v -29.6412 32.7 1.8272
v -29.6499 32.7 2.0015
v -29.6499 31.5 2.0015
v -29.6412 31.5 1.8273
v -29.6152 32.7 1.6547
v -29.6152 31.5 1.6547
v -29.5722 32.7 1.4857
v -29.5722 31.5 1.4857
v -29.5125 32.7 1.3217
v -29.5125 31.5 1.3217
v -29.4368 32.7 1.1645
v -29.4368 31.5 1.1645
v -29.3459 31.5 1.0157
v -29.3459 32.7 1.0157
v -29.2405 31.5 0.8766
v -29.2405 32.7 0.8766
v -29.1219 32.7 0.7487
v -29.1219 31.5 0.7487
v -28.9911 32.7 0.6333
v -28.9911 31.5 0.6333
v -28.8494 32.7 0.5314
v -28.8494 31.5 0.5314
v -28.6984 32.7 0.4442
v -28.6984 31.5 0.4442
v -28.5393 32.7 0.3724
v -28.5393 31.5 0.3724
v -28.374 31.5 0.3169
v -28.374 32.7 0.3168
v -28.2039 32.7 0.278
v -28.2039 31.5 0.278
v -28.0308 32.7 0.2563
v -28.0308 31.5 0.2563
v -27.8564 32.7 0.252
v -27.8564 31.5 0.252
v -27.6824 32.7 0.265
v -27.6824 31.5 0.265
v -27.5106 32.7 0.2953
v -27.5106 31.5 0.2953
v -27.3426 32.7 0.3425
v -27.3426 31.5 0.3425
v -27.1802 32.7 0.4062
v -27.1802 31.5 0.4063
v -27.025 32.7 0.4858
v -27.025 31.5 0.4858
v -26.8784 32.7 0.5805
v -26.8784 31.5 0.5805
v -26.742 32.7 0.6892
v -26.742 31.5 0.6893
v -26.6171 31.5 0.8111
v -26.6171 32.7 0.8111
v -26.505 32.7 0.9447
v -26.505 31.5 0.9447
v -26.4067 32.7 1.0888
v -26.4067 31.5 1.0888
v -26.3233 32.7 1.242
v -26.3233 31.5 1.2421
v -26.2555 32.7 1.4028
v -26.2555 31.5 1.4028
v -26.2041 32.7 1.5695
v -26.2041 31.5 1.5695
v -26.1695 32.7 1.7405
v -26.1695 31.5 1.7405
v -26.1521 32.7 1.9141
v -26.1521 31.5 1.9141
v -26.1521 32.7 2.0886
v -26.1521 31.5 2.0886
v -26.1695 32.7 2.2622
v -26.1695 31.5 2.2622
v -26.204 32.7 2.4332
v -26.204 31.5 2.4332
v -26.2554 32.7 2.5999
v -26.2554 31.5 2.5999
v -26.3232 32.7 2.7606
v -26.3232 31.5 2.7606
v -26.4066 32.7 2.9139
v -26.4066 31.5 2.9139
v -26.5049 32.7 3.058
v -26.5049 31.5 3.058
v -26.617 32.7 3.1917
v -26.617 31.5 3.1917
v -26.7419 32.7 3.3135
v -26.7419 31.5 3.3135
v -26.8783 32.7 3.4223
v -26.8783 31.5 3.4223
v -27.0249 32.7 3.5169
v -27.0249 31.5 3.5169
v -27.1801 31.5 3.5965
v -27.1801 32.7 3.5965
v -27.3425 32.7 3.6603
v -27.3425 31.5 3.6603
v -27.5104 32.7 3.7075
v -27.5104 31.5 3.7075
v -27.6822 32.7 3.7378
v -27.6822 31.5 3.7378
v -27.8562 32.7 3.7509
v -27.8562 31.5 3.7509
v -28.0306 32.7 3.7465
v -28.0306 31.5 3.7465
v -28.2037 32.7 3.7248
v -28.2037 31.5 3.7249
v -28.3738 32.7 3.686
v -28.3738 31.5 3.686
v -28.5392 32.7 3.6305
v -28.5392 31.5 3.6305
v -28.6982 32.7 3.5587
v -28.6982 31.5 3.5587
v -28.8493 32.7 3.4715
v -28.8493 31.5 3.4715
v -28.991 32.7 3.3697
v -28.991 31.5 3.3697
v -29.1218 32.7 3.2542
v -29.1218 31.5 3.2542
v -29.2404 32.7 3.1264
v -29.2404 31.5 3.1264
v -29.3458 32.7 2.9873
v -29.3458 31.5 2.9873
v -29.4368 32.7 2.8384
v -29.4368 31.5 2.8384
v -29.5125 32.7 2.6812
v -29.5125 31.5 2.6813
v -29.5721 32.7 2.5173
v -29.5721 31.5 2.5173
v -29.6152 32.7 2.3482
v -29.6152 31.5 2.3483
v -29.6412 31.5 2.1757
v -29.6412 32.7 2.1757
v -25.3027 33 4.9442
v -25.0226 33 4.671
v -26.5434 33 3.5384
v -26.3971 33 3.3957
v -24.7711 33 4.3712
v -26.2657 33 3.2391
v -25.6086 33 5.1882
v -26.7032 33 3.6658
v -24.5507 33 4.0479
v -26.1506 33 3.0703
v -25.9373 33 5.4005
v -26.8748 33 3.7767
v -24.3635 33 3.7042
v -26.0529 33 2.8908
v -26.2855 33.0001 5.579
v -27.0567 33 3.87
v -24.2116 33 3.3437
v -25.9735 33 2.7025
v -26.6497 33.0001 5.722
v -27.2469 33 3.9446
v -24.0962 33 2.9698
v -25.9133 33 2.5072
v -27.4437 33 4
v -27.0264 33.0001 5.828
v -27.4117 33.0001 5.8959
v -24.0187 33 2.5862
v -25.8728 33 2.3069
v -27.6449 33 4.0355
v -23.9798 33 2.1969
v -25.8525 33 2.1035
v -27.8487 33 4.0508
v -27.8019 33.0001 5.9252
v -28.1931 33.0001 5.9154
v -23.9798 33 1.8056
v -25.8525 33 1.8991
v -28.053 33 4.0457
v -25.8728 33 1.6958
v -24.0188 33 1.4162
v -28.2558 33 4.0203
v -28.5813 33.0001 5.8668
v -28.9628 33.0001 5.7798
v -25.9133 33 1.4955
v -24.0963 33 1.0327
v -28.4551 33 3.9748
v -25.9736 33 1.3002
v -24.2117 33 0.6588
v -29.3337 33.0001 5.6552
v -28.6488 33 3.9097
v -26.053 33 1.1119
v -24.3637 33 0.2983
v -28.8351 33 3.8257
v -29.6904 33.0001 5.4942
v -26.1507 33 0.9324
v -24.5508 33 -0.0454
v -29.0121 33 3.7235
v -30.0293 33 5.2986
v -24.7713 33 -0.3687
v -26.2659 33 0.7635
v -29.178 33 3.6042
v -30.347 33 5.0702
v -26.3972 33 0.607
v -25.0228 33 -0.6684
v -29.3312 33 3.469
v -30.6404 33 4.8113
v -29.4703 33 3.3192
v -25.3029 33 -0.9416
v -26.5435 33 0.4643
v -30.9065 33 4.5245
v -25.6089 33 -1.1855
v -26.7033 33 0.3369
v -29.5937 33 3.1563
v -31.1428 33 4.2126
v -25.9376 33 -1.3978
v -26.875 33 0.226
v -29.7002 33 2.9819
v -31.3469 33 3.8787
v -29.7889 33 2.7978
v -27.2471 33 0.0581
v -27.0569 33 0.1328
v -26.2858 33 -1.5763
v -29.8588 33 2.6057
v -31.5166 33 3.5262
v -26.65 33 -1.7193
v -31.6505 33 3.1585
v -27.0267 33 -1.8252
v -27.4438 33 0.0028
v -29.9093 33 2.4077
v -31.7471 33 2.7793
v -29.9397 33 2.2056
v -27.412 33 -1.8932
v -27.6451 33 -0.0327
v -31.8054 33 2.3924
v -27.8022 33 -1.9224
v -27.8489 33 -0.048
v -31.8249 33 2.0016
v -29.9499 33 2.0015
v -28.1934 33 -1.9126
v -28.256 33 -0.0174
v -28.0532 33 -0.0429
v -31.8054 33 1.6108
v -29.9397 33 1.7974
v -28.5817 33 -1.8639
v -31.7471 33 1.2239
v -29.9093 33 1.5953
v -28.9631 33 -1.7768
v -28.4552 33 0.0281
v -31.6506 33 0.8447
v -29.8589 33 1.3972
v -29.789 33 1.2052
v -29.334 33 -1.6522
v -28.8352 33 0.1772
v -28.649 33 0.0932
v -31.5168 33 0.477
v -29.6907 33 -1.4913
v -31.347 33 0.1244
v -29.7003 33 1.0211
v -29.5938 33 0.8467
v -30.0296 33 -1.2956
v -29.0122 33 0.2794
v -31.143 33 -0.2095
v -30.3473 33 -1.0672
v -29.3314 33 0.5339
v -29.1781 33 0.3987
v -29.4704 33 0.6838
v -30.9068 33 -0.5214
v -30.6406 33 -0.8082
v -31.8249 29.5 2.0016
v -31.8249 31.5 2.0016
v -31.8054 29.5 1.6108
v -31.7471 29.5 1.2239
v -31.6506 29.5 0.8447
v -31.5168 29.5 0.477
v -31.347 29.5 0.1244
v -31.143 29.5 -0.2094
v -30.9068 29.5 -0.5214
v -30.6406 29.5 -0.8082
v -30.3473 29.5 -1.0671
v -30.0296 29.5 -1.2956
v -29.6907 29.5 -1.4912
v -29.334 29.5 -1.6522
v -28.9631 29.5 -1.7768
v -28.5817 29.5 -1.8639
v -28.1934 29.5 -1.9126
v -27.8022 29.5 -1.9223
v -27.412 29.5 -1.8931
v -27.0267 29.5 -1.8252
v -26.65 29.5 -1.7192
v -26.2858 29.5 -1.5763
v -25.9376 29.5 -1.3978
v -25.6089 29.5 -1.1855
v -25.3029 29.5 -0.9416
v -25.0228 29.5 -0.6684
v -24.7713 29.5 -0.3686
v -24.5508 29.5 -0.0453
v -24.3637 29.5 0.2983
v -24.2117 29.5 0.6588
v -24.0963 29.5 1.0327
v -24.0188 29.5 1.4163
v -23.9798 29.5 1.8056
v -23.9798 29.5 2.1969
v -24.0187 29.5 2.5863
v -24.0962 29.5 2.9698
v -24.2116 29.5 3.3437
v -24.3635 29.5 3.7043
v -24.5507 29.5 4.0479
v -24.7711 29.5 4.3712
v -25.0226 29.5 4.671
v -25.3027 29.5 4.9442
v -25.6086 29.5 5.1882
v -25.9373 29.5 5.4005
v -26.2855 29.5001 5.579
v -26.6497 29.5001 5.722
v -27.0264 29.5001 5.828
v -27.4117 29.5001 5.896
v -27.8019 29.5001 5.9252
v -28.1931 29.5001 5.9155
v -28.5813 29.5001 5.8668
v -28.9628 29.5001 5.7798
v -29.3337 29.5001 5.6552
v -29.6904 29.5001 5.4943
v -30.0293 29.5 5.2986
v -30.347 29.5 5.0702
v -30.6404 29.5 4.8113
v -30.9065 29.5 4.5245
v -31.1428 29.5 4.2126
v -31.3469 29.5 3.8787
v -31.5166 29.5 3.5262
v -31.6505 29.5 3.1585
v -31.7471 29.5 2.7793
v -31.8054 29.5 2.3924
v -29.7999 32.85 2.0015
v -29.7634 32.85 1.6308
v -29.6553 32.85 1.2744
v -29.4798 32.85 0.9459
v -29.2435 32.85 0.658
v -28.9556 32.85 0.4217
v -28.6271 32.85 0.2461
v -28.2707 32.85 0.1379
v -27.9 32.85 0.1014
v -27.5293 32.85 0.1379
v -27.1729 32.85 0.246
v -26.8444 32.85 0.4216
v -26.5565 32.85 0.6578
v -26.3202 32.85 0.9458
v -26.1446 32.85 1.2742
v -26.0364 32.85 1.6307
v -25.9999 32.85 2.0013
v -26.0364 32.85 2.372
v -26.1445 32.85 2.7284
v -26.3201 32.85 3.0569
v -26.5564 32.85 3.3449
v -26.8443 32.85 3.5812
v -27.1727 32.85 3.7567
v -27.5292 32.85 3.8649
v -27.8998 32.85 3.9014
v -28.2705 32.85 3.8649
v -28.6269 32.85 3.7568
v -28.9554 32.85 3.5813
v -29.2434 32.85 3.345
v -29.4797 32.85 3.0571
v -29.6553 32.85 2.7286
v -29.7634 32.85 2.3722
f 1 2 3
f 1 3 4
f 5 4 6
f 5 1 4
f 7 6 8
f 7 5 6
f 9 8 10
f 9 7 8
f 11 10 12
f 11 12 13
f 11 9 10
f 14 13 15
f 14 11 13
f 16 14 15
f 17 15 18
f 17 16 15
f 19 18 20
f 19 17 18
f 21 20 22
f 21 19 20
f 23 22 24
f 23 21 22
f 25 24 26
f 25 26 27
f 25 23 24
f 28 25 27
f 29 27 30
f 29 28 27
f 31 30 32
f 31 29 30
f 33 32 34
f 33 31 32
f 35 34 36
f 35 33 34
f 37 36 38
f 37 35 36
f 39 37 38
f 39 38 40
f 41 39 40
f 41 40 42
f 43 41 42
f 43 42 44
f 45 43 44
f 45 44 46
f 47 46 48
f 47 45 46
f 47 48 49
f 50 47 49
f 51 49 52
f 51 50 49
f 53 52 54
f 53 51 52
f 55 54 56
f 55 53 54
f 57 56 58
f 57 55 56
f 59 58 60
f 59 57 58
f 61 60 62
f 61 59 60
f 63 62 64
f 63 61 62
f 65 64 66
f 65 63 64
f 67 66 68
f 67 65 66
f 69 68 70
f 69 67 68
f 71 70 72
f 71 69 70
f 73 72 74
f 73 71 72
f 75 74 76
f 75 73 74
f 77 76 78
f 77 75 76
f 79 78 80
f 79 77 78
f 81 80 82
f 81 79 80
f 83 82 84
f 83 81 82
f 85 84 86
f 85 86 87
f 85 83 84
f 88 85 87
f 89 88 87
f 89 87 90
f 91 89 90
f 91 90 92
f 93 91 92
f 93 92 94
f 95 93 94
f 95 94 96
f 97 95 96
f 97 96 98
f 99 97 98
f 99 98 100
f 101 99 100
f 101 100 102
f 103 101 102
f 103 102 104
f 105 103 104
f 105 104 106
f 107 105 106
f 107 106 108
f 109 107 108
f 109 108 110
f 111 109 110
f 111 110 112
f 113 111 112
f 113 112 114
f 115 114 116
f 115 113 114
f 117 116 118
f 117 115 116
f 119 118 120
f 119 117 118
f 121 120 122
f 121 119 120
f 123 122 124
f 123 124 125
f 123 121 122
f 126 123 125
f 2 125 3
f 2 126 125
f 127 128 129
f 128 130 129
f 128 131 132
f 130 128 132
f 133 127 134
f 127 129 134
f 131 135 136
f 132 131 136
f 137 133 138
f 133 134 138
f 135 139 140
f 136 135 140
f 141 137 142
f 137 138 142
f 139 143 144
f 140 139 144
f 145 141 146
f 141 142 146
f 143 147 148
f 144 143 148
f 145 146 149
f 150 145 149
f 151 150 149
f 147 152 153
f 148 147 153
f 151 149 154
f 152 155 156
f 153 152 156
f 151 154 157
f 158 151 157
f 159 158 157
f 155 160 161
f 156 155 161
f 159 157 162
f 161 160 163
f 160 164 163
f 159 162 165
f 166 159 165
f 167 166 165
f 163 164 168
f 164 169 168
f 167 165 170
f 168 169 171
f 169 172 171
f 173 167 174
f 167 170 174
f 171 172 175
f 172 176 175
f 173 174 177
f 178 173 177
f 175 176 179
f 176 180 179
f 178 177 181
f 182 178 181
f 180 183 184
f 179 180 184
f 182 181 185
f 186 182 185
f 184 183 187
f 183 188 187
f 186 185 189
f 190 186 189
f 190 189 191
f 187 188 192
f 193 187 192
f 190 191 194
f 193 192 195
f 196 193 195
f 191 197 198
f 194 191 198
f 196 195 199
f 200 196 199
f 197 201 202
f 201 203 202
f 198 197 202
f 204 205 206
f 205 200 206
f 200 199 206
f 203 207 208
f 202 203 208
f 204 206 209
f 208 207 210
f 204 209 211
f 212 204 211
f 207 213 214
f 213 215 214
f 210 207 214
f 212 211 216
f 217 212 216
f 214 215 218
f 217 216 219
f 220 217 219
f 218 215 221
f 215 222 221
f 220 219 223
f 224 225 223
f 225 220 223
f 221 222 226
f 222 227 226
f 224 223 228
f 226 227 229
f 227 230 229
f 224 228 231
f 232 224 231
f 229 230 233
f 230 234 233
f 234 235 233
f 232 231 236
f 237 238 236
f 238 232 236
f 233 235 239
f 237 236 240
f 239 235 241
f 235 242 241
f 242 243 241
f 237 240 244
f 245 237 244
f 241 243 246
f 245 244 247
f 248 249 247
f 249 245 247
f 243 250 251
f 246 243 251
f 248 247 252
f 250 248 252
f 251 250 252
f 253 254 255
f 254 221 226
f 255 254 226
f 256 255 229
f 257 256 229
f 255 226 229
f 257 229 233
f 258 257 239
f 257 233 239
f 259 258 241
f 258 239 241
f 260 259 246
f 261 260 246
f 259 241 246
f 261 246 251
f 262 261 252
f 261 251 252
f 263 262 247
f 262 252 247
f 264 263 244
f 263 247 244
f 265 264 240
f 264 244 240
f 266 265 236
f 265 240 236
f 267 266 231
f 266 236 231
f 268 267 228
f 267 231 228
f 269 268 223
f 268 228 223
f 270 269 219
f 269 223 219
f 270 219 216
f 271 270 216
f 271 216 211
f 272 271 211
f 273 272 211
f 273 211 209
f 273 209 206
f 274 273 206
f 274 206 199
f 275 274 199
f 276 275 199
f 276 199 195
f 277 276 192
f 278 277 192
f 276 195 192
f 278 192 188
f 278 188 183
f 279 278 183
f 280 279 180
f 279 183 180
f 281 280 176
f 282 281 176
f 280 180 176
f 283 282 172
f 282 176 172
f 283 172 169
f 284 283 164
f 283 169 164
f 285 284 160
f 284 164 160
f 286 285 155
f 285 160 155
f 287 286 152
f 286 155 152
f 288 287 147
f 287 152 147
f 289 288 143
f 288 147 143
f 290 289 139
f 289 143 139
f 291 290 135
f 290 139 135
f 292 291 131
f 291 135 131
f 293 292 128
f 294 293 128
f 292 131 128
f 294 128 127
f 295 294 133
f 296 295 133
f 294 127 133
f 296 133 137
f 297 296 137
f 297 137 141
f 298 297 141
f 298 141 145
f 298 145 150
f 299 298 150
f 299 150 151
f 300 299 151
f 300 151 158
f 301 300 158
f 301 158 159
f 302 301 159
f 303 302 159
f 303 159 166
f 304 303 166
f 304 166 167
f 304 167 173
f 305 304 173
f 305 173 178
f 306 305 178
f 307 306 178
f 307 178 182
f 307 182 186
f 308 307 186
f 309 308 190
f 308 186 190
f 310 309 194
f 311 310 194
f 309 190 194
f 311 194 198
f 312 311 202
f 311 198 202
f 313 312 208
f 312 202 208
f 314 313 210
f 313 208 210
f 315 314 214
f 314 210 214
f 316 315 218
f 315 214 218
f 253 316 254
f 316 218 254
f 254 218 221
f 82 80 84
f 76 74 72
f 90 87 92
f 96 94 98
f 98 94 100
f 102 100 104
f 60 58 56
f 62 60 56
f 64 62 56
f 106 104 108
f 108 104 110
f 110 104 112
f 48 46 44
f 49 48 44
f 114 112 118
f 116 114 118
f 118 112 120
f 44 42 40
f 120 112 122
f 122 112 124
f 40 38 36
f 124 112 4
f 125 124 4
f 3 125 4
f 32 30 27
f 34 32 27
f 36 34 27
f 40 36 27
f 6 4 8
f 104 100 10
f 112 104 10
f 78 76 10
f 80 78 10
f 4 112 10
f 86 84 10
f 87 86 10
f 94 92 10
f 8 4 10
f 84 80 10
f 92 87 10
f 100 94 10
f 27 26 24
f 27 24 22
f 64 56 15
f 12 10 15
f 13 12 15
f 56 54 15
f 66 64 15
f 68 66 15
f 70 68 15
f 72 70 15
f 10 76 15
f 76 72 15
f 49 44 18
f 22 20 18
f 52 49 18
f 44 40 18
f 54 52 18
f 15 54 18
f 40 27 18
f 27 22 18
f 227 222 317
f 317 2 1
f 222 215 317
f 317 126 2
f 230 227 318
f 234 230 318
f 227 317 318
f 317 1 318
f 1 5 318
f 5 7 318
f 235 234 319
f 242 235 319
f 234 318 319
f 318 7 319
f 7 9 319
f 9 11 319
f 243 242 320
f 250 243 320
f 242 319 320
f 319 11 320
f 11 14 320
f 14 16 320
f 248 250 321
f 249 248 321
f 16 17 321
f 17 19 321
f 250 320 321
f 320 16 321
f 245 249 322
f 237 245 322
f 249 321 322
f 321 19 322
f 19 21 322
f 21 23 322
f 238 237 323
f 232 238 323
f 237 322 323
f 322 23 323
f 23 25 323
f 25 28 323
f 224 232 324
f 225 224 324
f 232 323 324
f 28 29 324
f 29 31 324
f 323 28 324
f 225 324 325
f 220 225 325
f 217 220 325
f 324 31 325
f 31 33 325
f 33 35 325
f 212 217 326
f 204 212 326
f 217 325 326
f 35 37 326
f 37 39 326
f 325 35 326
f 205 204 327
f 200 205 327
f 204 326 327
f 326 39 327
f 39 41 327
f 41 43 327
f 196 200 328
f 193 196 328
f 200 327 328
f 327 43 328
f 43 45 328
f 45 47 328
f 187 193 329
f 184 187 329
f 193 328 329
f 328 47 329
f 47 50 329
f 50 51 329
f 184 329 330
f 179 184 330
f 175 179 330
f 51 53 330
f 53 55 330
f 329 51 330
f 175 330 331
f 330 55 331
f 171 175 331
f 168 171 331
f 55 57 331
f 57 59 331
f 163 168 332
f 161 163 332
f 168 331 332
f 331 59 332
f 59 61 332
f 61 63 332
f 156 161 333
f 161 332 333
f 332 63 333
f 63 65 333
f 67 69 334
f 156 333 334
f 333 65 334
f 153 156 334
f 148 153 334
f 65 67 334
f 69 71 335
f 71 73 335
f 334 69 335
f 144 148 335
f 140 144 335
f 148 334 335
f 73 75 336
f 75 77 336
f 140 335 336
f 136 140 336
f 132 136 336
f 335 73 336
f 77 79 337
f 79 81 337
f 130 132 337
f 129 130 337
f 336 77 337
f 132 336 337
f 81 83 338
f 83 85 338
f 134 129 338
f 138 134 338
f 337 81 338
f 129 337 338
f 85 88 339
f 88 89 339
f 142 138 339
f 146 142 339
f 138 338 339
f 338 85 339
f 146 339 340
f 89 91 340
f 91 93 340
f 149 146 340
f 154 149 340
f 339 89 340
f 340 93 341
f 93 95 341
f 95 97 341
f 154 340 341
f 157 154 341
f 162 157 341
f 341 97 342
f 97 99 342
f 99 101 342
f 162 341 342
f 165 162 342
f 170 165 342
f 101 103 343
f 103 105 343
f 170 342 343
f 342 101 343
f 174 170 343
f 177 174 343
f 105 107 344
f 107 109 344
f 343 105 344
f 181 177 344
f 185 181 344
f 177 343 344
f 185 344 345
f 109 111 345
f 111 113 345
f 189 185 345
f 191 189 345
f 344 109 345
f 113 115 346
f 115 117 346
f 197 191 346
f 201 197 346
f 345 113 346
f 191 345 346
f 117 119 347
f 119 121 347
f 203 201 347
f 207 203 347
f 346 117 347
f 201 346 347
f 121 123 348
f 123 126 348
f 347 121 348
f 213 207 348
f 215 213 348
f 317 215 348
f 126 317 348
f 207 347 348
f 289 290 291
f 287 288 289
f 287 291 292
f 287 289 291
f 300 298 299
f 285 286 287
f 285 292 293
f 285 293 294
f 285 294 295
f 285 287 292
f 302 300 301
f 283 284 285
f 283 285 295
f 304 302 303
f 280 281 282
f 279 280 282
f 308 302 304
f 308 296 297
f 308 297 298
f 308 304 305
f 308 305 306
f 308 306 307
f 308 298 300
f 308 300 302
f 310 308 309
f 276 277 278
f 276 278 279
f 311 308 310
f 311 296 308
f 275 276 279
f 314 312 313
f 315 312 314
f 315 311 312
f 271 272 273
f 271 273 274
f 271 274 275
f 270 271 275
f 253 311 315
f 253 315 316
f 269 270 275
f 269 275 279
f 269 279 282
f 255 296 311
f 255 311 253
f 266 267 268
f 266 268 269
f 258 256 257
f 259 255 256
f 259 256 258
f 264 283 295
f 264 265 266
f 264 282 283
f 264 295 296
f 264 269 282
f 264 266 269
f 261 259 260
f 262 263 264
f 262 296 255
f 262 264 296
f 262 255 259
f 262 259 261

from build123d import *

# Parameters (mm, degrees)
SKETCH034_R     = 3.925
SKETCH034_R_2   = 1.75
PAD016_DEPTH    = 1.5
SKETCH035_R     = 3.925
PAD017_DEPTH    = 2
CHAMFER001_SIZE = 0.3


with BuildPart() as part:
    # Sketch034 (on DatumPlane) → Pad016 (new body)
    with BuildSketch(Plane(origin=(0.0002244487, 33.0000455142, 5.0001576066), x_dir=(-0.999999999, 4e-10, 4.48856e-05), z_dir=(0, -1, 9.1023e-06))):
        with Locations((27.900008, 3)):
            Circle(SKETCH034_R)
        with Locations((27.900008, 3)):
            Circle(SKETCH034_R_2, mode=Mode.SUBTRACT)
    extrude(amount=PAD016_DEPTH)

    # Sketch035 (on Face4 of Pad016) → Pad017 (join)
    with BuildSketch(Plane(origin=(0.0002244487, 31.5000455143, 5.00017126), x_dir=(-0.999999999, 4e-10, 4.48856e-05), z_dir=(0, -1, 9.1023e-06))):
        with Locations((27.900008, 3)):
            Circle(SKETCH035_R)
    extrude(amount=PAD017_DEPTH)

    # Chamfer001
    chamfer001_edges = [part.edges().sort_by_distance(p)[0] for p in [
        (-26.149918, 33.000018, 2.001331),
    ]]
    chamfer(chamfer001_edges, length=CHAMFER001_SIZE)


solid = part.part
